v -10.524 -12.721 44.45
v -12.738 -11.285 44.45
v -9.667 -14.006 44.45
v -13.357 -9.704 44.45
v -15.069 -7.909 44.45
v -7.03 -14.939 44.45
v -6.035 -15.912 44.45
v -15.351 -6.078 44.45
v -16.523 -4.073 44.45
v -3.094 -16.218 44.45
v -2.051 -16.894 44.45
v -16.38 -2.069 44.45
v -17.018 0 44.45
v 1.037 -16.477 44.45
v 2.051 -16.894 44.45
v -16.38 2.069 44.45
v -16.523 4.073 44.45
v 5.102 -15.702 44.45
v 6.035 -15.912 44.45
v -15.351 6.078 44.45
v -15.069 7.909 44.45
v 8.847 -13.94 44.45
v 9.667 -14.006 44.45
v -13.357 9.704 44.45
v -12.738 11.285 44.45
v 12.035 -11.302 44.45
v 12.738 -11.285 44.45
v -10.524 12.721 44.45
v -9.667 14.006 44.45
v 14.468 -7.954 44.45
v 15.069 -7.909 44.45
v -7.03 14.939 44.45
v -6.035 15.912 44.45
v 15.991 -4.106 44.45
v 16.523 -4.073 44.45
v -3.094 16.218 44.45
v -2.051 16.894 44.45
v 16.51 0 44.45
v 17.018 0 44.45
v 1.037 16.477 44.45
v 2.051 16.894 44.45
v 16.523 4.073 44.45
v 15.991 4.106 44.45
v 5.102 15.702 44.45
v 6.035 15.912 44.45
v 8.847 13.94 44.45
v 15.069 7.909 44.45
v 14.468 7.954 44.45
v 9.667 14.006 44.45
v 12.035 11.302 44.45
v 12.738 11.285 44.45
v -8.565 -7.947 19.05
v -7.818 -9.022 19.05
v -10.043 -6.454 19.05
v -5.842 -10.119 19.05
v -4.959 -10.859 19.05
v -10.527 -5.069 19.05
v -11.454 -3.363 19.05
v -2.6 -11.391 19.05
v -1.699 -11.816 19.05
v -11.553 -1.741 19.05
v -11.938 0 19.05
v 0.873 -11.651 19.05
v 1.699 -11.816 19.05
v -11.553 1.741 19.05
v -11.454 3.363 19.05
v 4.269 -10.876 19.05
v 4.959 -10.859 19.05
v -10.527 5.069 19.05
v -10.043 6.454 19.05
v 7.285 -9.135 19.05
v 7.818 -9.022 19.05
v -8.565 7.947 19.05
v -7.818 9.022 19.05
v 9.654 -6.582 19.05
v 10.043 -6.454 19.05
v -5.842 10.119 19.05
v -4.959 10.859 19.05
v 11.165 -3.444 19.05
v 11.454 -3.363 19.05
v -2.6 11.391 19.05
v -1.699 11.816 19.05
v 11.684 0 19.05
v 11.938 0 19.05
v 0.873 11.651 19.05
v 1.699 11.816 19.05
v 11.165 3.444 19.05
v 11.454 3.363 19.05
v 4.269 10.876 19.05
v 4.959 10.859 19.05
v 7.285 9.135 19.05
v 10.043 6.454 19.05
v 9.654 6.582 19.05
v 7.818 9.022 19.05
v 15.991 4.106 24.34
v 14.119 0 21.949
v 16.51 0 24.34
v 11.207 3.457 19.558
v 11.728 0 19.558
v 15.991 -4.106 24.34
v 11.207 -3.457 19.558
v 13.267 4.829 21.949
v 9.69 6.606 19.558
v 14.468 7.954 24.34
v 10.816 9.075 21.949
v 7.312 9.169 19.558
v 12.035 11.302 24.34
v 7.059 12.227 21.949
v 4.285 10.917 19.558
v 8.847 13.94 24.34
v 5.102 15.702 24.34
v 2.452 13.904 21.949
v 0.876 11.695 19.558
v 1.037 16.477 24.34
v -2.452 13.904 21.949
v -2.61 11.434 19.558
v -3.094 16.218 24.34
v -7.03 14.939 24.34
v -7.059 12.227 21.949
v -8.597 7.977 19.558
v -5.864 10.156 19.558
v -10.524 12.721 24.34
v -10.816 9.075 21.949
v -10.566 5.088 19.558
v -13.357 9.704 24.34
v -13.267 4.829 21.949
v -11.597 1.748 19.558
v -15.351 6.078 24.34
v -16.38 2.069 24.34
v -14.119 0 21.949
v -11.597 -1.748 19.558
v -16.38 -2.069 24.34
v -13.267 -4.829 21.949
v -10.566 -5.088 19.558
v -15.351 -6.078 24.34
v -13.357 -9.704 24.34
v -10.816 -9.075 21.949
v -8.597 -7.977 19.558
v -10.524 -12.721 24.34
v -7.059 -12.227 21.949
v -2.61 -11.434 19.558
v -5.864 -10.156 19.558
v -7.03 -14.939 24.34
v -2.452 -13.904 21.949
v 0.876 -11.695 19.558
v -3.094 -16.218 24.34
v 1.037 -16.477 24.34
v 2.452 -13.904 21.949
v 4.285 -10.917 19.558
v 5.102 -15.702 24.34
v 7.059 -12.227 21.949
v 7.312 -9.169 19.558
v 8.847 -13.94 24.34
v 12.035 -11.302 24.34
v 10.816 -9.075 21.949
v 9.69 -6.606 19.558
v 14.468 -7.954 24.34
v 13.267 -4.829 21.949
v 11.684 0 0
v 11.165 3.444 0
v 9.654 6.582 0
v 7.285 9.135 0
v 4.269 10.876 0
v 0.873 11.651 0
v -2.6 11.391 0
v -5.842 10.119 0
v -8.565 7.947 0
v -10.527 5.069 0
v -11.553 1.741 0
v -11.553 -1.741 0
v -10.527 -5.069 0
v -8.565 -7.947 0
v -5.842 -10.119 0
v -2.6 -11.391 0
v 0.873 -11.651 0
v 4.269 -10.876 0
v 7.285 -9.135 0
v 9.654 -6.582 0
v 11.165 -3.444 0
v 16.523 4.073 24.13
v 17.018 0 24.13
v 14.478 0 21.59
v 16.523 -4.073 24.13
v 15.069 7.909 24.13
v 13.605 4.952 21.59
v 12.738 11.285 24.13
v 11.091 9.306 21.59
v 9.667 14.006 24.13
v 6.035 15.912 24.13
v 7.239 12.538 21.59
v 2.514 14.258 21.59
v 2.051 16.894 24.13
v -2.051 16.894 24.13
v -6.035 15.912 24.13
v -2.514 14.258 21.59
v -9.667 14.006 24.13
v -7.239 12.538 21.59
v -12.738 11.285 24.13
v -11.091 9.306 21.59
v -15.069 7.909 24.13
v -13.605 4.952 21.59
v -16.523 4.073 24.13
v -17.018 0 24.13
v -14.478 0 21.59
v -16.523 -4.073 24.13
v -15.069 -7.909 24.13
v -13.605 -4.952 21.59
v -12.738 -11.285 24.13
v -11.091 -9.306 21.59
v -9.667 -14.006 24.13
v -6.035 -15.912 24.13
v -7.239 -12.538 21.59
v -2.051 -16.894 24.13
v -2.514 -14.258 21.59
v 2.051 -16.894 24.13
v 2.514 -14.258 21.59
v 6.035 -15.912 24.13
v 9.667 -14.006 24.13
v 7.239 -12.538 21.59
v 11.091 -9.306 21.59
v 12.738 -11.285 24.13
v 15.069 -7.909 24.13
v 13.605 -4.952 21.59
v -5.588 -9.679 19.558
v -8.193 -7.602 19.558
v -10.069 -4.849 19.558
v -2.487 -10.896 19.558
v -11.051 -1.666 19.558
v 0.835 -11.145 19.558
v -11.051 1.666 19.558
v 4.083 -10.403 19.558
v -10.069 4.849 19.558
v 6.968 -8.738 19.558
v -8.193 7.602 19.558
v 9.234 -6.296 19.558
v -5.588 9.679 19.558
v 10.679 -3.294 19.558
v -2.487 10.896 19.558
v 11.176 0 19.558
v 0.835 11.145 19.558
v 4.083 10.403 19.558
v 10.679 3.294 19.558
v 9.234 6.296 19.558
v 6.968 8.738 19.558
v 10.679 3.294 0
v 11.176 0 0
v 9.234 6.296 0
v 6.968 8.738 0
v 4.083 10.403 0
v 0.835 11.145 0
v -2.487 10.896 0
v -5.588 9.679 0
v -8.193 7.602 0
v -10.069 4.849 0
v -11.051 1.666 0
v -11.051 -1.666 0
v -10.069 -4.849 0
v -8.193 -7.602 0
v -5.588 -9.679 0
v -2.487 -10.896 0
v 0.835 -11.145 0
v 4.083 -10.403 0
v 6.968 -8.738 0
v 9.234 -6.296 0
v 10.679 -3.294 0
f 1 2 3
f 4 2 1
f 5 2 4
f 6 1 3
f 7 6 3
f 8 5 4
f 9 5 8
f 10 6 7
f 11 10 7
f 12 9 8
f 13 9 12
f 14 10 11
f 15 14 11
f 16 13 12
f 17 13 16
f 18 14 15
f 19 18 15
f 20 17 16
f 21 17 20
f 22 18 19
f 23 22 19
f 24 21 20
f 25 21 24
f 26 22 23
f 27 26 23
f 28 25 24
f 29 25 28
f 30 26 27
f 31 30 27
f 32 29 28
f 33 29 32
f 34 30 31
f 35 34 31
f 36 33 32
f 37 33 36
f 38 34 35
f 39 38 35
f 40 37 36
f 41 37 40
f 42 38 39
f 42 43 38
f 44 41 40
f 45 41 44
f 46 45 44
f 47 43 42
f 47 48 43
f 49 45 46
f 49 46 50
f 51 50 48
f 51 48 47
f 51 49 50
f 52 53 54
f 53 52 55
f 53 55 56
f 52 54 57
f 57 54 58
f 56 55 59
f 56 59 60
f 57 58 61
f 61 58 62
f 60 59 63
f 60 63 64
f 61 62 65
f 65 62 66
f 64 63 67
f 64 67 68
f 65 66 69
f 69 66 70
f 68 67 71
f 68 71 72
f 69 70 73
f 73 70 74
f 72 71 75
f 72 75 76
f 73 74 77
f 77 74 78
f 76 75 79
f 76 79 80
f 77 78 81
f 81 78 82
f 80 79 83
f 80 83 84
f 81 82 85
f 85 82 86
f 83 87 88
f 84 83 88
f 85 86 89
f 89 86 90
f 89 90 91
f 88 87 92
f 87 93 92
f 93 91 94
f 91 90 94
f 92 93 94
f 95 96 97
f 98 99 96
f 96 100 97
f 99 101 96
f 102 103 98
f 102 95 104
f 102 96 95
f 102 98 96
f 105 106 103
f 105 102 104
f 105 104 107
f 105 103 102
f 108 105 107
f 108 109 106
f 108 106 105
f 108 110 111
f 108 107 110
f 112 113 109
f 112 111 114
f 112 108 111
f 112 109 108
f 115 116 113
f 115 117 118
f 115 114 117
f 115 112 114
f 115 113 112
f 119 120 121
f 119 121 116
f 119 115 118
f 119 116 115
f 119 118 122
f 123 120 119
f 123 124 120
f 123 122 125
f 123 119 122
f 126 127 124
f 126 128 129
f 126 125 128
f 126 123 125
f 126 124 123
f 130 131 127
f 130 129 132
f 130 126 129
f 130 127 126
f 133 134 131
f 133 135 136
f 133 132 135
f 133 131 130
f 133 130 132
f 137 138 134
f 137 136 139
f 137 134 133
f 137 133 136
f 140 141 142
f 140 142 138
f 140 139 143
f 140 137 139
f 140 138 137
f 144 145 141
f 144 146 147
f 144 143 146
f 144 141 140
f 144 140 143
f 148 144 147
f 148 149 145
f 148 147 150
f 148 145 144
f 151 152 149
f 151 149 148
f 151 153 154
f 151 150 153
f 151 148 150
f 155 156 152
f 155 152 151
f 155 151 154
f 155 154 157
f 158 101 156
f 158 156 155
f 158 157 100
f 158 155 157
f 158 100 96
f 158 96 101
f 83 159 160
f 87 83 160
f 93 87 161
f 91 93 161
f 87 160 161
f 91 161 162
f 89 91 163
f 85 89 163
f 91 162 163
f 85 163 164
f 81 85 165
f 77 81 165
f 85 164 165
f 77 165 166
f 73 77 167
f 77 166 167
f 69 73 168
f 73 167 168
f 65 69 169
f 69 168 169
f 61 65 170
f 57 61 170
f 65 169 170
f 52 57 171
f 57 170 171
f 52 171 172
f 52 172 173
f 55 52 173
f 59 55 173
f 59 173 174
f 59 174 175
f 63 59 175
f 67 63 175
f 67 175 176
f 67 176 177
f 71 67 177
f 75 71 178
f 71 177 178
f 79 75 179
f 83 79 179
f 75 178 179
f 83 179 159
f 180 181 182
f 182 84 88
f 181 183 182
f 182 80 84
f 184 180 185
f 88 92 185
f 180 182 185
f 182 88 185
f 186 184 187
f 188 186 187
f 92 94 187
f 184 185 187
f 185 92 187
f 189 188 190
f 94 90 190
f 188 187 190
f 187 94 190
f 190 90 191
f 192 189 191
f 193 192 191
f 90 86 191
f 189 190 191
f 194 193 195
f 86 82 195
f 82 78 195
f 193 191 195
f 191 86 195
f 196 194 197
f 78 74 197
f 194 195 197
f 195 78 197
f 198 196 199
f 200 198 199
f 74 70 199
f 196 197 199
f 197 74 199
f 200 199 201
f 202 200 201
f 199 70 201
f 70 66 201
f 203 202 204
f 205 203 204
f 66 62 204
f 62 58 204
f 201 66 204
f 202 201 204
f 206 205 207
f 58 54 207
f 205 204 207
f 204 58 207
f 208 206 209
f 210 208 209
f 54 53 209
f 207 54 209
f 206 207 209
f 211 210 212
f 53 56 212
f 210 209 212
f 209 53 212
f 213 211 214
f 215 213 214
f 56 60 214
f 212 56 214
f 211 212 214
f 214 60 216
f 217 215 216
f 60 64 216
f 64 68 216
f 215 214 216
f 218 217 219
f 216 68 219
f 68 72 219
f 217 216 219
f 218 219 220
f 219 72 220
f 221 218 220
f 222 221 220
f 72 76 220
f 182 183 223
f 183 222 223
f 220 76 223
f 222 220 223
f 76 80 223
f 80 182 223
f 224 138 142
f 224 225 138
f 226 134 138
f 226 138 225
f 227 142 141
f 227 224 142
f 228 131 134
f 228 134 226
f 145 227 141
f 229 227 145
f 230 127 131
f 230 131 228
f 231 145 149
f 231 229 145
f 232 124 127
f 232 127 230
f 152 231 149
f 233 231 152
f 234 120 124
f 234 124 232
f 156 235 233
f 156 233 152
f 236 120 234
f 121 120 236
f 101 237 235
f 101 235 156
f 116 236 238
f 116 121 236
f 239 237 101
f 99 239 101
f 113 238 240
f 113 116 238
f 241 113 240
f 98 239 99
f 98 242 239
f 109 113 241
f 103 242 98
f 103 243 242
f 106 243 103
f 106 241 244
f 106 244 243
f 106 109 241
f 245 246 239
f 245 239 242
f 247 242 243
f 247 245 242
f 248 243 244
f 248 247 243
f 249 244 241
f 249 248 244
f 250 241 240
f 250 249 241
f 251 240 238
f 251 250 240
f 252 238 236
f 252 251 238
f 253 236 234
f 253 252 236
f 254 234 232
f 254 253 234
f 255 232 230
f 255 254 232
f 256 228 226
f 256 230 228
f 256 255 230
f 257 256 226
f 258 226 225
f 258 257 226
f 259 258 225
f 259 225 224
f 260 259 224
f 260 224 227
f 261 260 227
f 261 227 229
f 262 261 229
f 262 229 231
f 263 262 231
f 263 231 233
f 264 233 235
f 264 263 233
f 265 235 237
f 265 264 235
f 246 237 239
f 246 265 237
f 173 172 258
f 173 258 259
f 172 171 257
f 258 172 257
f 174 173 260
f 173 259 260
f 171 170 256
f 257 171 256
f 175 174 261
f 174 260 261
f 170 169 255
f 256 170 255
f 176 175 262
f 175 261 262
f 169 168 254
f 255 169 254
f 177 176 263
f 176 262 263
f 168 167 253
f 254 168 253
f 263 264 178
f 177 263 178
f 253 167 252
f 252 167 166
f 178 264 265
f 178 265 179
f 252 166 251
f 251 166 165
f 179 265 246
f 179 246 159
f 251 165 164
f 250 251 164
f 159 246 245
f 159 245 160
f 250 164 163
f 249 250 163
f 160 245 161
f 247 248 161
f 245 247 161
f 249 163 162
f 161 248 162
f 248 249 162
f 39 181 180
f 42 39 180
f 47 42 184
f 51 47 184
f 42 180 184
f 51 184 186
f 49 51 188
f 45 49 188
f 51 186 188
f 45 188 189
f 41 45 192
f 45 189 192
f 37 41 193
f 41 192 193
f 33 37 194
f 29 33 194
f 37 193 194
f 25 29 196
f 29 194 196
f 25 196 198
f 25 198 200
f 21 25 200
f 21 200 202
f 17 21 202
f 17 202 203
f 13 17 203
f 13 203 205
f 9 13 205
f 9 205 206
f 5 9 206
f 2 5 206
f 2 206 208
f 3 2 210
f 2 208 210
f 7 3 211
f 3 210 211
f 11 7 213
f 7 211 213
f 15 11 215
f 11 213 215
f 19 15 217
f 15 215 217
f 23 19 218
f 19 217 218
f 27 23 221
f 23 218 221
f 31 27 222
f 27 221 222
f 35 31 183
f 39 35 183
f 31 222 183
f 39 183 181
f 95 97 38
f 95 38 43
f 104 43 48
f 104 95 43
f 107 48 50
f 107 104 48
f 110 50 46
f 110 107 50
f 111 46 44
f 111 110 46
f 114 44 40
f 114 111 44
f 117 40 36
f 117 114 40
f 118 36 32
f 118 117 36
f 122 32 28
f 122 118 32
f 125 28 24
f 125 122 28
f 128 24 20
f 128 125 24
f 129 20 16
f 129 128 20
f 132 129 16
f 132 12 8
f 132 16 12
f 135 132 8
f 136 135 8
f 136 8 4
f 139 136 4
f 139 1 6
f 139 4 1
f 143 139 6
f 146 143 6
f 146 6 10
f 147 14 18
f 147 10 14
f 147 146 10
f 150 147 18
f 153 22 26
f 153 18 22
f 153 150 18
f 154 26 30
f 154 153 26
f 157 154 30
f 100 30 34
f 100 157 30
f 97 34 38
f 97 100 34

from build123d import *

# Parameters (mm, degrees)
F0_R     = 11.684
F1_DEPTH = 19.05
F2_R     = 17.018
F2_R_2   = 11.684
F3_DEPTH = 25.4
F4_SIZE2 = 5.08
F4_SIZE  = 5.08
F5_T     = -0.508


with BuildPart() as f1:
    # F0 (on Top) → F1 (new body)
    with BuildSketch(Plane.XY):
        Circle(F0_R)
    extrude(amount=F1_DEPTH)

    # F2 (on face) → F3 (join)
    with BuildSketch(Plane.XY.offset(19.05)):
        Circle(F2_R)
        Circle(F2_R_2, mode=Mode.SUBTRACT)
        Circle(F2_R_2)
    extrude(amount=F3_DEPTH)

    # F4
    f4_edges = [f1.edges().sort_by_distance(p)[0] for p in [
        (-17.018, 0, 19.05),
    ]]
    chamfer(f4_edges, length=F4_SIZE, length2=F4_SIZE2)

    # F5
    f5_openings = [f1.faces().sort_by_distance(p)[0] for p in [
        (0, 0, 44.45),
        (0, 0, 0),
    ]]
    offset(amount=F5_T, openings=f5_openings, kind=Kind.INTERSECTION)


solid = f1.part
